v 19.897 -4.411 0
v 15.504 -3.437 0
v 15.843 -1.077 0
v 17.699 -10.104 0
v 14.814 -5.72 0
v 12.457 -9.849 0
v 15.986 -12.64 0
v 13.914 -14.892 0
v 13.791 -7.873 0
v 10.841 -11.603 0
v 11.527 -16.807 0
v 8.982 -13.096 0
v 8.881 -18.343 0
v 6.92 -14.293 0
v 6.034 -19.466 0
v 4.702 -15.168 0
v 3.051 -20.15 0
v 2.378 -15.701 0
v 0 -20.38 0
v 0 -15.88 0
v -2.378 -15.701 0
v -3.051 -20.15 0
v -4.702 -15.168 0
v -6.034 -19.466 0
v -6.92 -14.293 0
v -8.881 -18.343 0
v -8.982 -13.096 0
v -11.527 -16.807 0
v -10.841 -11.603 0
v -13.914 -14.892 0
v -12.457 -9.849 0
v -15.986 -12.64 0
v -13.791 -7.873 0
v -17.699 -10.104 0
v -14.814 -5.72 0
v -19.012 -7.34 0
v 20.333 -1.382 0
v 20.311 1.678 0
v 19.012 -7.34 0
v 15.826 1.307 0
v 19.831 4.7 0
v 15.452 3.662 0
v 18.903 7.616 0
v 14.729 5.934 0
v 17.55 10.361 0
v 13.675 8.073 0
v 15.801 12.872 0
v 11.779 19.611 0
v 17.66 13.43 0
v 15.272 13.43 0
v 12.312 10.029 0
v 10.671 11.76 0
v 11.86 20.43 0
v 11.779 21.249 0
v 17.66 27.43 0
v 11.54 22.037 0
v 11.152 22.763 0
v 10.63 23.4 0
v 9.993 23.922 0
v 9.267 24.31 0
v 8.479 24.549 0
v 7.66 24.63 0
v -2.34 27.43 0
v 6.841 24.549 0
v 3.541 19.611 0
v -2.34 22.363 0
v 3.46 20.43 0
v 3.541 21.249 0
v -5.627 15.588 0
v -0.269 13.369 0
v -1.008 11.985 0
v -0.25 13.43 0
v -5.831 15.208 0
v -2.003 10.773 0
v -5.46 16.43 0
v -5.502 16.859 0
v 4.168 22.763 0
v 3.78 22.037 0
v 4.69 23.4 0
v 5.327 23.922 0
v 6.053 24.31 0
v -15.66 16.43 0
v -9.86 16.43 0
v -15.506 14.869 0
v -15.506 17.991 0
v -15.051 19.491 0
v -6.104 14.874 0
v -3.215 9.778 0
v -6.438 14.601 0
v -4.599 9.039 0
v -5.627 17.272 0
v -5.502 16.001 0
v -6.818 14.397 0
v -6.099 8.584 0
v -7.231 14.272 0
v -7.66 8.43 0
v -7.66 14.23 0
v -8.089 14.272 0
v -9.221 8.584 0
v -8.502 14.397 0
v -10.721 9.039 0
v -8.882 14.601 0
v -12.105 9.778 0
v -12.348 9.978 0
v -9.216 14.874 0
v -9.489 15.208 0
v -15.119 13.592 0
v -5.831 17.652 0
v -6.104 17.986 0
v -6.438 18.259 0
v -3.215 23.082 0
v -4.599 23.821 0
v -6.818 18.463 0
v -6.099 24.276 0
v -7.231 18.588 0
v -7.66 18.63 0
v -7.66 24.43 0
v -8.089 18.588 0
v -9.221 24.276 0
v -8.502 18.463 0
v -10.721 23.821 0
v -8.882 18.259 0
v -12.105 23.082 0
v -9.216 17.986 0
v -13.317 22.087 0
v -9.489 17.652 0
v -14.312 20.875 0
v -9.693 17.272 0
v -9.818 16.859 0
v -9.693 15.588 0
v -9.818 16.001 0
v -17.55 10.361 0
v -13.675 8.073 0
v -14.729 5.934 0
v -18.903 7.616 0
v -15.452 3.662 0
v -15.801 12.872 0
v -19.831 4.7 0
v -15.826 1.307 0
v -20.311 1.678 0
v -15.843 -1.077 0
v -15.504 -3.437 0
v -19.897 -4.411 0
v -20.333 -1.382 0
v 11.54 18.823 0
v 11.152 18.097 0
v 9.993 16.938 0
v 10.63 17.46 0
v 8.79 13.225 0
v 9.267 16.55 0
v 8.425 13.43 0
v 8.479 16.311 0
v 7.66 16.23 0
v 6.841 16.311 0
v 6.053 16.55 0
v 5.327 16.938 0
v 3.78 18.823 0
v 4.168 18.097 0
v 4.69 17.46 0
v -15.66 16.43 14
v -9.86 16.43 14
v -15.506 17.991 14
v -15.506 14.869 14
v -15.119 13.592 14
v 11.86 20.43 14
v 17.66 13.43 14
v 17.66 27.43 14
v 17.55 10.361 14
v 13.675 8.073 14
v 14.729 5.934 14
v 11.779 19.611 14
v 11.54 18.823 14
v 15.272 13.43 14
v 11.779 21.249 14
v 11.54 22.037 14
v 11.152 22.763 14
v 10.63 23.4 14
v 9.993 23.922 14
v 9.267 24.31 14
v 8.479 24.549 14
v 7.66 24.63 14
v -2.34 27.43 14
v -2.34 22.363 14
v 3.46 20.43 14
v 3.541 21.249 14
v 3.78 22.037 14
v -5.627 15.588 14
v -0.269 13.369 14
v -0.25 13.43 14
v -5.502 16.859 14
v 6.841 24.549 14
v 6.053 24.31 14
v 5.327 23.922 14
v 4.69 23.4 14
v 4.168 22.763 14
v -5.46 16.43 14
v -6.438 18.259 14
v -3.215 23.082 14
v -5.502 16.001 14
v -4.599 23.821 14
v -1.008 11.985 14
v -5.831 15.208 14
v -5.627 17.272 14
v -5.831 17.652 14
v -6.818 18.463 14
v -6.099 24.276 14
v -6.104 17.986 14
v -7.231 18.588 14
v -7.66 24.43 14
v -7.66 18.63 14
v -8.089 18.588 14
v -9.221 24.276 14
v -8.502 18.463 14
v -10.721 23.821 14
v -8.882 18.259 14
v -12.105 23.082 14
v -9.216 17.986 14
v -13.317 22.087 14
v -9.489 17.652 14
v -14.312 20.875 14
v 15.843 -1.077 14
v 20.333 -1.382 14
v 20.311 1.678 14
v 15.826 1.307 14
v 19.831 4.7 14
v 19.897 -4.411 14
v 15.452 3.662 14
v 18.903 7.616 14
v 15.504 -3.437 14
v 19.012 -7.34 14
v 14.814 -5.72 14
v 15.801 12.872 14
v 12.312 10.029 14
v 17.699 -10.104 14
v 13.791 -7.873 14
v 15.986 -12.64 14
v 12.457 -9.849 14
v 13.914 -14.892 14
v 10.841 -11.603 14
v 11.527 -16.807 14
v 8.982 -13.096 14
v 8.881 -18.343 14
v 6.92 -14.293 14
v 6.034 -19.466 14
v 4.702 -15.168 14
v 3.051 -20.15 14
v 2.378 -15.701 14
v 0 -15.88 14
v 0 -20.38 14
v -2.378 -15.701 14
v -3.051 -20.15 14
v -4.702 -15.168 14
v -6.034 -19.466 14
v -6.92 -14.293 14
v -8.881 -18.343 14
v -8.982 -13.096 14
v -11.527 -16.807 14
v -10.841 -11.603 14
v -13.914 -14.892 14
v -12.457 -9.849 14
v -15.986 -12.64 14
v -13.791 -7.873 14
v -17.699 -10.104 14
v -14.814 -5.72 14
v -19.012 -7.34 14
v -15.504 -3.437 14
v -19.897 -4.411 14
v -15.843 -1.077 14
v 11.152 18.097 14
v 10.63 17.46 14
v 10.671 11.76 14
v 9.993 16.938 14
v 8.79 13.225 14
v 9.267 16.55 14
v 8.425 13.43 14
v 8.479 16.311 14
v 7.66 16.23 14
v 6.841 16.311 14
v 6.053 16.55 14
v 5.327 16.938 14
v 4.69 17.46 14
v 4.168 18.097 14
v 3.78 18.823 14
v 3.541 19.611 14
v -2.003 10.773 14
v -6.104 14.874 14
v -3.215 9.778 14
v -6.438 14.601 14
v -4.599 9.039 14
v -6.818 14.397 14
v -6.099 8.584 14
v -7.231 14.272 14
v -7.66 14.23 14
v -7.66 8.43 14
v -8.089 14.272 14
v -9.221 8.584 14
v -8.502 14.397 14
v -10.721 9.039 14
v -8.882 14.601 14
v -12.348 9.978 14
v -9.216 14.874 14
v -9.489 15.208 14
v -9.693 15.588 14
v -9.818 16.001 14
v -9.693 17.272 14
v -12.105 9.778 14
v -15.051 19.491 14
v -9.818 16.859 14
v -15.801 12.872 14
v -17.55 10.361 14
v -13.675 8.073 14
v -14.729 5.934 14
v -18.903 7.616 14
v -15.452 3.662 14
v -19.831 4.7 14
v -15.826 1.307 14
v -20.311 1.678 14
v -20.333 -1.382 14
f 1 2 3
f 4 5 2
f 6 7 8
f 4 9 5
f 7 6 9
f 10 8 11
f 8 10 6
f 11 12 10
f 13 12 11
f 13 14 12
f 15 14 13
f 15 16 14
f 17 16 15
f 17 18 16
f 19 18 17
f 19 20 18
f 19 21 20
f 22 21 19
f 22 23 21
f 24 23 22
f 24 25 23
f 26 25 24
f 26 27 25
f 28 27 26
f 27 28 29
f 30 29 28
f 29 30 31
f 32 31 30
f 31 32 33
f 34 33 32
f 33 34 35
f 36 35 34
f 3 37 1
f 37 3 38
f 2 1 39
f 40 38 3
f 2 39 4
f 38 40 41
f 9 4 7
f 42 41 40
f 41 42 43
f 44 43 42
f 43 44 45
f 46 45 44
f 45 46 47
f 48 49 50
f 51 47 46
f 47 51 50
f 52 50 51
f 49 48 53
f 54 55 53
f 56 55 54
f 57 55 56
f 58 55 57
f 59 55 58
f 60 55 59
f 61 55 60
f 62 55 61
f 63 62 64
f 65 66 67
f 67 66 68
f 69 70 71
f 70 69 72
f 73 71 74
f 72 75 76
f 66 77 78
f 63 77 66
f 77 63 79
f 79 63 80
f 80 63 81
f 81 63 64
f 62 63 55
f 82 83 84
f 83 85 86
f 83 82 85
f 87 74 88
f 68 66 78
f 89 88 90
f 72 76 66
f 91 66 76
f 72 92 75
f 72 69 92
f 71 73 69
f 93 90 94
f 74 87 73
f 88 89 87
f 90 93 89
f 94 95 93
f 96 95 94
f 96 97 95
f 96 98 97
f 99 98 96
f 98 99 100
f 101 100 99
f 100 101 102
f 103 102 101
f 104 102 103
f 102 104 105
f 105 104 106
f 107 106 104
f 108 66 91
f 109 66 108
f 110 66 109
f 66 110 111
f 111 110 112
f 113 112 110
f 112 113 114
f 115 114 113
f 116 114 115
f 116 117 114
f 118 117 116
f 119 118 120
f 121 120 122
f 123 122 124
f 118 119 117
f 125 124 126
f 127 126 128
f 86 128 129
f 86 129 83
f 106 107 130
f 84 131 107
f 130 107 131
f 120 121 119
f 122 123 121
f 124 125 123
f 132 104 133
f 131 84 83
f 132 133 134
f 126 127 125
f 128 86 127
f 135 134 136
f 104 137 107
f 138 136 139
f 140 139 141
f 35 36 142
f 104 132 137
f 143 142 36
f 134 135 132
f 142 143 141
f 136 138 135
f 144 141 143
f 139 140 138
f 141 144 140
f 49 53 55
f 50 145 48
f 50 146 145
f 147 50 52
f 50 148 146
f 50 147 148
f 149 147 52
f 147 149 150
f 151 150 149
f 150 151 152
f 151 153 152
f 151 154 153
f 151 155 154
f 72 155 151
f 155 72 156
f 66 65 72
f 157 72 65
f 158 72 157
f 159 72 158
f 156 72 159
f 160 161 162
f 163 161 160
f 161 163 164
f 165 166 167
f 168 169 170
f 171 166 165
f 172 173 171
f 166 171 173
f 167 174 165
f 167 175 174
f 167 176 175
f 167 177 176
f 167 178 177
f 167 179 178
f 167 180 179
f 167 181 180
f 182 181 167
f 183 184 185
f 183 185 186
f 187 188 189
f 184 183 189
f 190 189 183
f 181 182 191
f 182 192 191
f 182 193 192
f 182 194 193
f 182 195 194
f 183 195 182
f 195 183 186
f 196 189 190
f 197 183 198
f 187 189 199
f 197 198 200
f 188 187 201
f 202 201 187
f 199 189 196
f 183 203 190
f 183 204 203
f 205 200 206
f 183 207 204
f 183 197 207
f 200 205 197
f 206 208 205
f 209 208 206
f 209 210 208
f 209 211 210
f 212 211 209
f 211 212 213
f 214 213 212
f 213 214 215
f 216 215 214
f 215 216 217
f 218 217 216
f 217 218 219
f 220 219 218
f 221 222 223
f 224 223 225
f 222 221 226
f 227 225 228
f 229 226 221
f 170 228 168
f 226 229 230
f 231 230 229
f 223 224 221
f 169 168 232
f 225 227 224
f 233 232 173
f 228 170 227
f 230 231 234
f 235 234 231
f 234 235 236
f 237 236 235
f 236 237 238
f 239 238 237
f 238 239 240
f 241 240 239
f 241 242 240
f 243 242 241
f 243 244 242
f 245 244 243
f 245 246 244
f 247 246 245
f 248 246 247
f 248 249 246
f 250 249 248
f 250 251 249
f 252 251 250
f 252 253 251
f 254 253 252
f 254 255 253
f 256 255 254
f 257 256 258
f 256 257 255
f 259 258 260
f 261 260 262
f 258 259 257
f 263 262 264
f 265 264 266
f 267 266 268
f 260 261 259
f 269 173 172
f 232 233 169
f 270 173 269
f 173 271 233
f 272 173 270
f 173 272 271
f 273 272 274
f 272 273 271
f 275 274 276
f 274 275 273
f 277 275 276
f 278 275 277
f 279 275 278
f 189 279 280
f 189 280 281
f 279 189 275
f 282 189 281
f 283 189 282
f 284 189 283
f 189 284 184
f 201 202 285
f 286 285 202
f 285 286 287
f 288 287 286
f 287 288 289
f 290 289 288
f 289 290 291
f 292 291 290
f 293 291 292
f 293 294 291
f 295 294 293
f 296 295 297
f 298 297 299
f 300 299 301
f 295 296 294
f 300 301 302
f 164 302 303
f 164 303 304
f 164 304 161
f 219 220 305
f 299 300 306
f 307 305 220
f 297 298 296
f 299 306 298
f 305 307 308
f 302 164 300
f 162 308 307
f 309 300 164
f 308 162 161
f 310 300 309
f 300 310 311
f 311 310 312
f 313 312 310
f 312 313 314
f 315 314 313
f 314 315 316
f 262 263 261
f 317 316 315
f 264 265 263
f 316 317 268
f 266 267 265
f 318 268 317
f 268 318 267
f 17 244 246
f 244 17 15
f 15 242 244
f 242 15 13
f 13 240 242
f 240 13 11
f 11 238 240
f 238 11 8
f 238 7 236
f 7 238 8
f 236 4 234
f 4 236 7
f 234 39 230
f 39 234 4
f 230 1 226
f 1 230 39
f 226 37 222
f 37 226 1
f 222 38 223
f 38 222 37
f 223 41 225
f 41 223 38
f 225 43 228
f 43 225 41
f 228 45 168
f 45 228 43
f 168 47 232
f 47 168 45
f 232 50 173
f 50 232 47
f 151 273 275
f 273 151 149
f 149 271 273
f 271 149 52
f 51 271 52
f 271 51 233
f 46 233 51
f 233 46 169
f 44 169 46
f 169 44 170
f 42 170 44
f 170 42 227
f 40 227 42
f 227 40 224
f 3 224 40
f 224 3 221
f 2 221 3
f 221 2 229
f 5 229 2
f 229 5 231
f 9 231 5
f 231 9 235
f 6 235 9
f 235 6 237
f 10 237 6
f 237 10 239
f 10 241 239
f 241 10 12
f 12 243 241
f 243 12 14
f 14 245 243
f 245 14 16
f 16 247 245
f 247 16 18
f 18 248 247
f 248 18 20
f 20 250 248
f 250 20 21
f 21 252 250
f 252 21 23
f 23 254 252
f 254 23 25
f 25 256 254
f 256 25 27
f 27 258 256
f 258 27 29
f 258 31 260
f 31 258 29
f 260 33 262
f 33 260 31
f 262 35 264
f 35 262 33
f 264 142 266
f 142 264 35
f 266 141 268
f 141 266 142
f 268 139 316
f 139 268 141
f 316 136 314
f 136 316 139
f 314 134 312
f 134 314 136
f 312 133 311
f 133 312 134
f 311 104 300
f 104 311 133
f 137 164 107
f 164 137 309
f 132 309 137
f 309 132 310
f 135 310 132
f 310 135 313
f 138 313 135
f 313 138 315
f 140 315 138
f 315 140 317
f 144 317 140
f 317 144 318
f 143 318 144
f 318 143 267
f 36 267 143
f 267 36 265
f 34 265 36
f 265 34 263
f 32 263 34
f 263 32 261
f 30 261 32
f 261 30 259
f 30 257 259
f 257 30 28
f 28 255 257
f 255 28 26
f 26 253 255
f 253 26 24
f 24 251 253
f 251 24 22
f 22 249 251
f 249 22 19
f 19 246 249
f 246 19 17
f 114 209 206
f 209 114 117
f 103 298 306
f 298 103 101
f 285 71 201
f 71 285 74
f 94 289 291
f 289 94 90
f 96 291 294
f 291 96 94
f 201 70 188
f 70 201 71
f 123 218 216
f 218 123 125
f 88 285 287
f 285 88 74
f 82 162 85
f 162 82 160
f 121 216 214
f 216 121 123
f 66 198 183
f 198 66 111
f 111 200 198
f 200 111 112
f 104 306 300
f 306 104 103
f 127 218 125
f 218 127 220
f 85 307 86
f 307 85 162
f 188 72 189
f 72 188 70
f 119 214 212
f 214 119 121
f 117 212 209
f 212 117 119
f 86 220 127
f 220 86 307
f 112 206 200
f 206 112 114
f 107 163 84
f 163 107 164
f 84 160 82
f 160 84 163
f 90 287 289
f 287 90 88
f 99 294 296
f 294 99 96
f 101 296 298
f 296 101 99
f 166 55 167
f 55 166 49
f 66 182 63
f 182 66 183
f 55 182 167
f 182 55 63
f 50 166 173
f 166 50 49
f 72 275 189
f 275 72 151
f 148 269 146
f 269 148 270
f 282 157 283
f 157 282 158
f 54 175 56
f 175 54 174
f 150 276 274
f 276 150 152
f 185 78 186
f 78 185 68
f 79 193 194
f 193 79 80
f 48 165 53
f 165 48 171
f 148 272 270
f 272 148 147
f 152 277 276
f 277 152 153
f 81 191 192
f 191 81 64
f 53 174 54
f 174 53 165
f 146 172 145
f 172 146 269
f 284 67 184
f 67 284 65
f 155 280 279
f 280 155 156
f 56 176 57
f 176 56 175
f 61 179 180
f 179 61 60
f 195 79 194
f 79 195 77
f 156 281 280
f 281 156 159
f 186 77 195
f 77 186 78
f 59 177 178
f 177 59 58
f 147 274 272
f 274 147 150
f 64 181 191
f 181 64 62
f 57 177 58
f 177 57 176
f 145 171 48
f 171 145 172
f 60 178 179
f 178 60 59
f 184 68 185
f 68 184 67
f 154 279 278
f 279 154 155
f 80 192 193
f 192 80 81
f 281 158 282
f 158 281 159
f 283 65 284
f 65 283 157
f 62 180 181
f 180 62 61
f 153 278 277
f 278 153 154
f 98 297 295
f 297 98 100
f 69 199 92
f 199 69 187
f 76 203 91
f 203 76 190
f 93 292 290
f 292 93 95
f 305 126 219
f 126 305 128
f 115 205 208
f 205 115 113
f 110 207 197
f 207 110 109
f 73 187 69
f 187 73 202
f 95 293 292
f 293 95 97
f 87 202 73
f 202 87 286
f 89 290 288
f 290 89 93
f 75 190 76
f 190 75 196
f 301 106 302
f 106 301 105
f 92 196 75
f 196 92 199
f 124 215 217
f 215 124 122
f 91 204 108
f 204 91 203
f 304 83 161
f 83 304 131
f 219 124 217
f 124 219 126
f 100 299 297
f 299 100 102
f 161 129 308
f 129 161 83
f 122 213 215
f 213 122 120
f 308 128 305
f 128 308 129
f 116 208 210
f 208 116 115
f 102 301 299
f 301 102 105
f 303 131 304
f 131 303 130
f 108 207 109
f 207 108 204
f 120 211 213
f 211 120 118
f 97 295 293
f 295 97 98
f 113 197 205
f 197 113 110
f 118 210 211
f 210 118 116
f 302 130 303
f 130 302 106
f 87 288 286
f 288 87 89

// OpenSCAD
$fn = 32;

// ----------------------------------------------------------------------
// Pipe clamp: 40.76 mm ring, 4.5 mm wall, 14 mm wide
// ----------------------------------------------------------------------

// --- parameters (mm) ---
outer_r = 20.38;          // clamp outside radius
inner_r = 15.88;          // pipe bore radius
band = 4.5;               // band thickness
clamp_w = 14;             // clamp width
opening = 50;             // opening angle between the ends
lug_w = 20;               // lug width
lug_len = 14;             // lug length
bolt_d = 8.4;             // bolt hole
knuckle_d = 16;           // hinge knuckle diameter
pin_d = 4.4;              // hinge pin hole

clamp_profile = [[-8.613, 18.471], [-11.281, 16.973], [-13.696, 15.092], [-15.801, 12.872], [-17.55, 10.361], [-18.903, 7.616], [-19.831, 4.7], [-20.311, 1.678], [-20.333, -1.382], [-19.897, -4.411], [-19.012, -7.34], [-17.699, -10.104], [-15.986, -12.64], [-13.914, -14.892], [-11.527, -16.807], [-8.881, -18.343], [-6.034, -19.466], [-3.051, -20.15], [0, -20.38], [3.051, -20.15], [6.034, -19.466], [8.881, -18.343], [11.527, -16.807], [13.914, -14.892], [15.986, -12.64], [17.699, -10.104], [19.012, -7.34], [19.897, -4.411], [20.333, -1.382], [20.311, 1.678], [19.831, 4.7], [18.903, 7.616], [17.55, 10.361], [15.801, 12.872], [13.696, 15.092], [11.281, 16.973], [8.613, 18.471], [6.711, 14.392], [8.79, 13.225], [10.671, 11.76], [12.312, 10.029], [13.675, 8.073], [14.729, 5.934], [15.452, 3.662], [15.826, 1.307], [15.843, -1.077], [15.504, -3.437], [14.814, -5.72], [13.791, -7.873], [12.457, -9.849], [10.841, -11.603], [8.982, -13.096], [6.92, -14.293], [4.702, -15.168], [2.378, -15.701], [0, -15.88], [-2.378, -15.701], [-4.702, -15.168], [-6.92, -14.293], [-8.982, -13.096], [-10.841, -11.603], [-12.457, -9.849], [-13.791, -7.873], [-14.814, -5.72], [-15.504, -3.437], [-15.843, -1.077], [-15.826, 1.307], [-15.452, 3.662], [-14.729, 5.934], [-13.675, 8.073], [-12.312, 10.029], [-10.671, 11.76], [-8.79, 13.225], [-6.711, 14.392]];

difference() {
  union() {
    linear_extrude(height = clamp_w) polygon(clamp_profile);
    /* hinge knuckle, sunk 2 mm into the band end */
    translate([-7.66, 16.43, 0]) cylinder(h = clamp_w, d = knuckle_d);
    /* bolt lug on the other end */
    translate([-2.34, 13.43, 0]) cube([lug_w, 14, clamp_w]);
  }
  translate([7.66, 20.43, -2.5]) cylinder(h = clamp_w + 5, d = bolt_d);
  translate([-7.66, 16.43, -2.5]) cylinder(h = clamp_w + 5, d = pin_d);
}
